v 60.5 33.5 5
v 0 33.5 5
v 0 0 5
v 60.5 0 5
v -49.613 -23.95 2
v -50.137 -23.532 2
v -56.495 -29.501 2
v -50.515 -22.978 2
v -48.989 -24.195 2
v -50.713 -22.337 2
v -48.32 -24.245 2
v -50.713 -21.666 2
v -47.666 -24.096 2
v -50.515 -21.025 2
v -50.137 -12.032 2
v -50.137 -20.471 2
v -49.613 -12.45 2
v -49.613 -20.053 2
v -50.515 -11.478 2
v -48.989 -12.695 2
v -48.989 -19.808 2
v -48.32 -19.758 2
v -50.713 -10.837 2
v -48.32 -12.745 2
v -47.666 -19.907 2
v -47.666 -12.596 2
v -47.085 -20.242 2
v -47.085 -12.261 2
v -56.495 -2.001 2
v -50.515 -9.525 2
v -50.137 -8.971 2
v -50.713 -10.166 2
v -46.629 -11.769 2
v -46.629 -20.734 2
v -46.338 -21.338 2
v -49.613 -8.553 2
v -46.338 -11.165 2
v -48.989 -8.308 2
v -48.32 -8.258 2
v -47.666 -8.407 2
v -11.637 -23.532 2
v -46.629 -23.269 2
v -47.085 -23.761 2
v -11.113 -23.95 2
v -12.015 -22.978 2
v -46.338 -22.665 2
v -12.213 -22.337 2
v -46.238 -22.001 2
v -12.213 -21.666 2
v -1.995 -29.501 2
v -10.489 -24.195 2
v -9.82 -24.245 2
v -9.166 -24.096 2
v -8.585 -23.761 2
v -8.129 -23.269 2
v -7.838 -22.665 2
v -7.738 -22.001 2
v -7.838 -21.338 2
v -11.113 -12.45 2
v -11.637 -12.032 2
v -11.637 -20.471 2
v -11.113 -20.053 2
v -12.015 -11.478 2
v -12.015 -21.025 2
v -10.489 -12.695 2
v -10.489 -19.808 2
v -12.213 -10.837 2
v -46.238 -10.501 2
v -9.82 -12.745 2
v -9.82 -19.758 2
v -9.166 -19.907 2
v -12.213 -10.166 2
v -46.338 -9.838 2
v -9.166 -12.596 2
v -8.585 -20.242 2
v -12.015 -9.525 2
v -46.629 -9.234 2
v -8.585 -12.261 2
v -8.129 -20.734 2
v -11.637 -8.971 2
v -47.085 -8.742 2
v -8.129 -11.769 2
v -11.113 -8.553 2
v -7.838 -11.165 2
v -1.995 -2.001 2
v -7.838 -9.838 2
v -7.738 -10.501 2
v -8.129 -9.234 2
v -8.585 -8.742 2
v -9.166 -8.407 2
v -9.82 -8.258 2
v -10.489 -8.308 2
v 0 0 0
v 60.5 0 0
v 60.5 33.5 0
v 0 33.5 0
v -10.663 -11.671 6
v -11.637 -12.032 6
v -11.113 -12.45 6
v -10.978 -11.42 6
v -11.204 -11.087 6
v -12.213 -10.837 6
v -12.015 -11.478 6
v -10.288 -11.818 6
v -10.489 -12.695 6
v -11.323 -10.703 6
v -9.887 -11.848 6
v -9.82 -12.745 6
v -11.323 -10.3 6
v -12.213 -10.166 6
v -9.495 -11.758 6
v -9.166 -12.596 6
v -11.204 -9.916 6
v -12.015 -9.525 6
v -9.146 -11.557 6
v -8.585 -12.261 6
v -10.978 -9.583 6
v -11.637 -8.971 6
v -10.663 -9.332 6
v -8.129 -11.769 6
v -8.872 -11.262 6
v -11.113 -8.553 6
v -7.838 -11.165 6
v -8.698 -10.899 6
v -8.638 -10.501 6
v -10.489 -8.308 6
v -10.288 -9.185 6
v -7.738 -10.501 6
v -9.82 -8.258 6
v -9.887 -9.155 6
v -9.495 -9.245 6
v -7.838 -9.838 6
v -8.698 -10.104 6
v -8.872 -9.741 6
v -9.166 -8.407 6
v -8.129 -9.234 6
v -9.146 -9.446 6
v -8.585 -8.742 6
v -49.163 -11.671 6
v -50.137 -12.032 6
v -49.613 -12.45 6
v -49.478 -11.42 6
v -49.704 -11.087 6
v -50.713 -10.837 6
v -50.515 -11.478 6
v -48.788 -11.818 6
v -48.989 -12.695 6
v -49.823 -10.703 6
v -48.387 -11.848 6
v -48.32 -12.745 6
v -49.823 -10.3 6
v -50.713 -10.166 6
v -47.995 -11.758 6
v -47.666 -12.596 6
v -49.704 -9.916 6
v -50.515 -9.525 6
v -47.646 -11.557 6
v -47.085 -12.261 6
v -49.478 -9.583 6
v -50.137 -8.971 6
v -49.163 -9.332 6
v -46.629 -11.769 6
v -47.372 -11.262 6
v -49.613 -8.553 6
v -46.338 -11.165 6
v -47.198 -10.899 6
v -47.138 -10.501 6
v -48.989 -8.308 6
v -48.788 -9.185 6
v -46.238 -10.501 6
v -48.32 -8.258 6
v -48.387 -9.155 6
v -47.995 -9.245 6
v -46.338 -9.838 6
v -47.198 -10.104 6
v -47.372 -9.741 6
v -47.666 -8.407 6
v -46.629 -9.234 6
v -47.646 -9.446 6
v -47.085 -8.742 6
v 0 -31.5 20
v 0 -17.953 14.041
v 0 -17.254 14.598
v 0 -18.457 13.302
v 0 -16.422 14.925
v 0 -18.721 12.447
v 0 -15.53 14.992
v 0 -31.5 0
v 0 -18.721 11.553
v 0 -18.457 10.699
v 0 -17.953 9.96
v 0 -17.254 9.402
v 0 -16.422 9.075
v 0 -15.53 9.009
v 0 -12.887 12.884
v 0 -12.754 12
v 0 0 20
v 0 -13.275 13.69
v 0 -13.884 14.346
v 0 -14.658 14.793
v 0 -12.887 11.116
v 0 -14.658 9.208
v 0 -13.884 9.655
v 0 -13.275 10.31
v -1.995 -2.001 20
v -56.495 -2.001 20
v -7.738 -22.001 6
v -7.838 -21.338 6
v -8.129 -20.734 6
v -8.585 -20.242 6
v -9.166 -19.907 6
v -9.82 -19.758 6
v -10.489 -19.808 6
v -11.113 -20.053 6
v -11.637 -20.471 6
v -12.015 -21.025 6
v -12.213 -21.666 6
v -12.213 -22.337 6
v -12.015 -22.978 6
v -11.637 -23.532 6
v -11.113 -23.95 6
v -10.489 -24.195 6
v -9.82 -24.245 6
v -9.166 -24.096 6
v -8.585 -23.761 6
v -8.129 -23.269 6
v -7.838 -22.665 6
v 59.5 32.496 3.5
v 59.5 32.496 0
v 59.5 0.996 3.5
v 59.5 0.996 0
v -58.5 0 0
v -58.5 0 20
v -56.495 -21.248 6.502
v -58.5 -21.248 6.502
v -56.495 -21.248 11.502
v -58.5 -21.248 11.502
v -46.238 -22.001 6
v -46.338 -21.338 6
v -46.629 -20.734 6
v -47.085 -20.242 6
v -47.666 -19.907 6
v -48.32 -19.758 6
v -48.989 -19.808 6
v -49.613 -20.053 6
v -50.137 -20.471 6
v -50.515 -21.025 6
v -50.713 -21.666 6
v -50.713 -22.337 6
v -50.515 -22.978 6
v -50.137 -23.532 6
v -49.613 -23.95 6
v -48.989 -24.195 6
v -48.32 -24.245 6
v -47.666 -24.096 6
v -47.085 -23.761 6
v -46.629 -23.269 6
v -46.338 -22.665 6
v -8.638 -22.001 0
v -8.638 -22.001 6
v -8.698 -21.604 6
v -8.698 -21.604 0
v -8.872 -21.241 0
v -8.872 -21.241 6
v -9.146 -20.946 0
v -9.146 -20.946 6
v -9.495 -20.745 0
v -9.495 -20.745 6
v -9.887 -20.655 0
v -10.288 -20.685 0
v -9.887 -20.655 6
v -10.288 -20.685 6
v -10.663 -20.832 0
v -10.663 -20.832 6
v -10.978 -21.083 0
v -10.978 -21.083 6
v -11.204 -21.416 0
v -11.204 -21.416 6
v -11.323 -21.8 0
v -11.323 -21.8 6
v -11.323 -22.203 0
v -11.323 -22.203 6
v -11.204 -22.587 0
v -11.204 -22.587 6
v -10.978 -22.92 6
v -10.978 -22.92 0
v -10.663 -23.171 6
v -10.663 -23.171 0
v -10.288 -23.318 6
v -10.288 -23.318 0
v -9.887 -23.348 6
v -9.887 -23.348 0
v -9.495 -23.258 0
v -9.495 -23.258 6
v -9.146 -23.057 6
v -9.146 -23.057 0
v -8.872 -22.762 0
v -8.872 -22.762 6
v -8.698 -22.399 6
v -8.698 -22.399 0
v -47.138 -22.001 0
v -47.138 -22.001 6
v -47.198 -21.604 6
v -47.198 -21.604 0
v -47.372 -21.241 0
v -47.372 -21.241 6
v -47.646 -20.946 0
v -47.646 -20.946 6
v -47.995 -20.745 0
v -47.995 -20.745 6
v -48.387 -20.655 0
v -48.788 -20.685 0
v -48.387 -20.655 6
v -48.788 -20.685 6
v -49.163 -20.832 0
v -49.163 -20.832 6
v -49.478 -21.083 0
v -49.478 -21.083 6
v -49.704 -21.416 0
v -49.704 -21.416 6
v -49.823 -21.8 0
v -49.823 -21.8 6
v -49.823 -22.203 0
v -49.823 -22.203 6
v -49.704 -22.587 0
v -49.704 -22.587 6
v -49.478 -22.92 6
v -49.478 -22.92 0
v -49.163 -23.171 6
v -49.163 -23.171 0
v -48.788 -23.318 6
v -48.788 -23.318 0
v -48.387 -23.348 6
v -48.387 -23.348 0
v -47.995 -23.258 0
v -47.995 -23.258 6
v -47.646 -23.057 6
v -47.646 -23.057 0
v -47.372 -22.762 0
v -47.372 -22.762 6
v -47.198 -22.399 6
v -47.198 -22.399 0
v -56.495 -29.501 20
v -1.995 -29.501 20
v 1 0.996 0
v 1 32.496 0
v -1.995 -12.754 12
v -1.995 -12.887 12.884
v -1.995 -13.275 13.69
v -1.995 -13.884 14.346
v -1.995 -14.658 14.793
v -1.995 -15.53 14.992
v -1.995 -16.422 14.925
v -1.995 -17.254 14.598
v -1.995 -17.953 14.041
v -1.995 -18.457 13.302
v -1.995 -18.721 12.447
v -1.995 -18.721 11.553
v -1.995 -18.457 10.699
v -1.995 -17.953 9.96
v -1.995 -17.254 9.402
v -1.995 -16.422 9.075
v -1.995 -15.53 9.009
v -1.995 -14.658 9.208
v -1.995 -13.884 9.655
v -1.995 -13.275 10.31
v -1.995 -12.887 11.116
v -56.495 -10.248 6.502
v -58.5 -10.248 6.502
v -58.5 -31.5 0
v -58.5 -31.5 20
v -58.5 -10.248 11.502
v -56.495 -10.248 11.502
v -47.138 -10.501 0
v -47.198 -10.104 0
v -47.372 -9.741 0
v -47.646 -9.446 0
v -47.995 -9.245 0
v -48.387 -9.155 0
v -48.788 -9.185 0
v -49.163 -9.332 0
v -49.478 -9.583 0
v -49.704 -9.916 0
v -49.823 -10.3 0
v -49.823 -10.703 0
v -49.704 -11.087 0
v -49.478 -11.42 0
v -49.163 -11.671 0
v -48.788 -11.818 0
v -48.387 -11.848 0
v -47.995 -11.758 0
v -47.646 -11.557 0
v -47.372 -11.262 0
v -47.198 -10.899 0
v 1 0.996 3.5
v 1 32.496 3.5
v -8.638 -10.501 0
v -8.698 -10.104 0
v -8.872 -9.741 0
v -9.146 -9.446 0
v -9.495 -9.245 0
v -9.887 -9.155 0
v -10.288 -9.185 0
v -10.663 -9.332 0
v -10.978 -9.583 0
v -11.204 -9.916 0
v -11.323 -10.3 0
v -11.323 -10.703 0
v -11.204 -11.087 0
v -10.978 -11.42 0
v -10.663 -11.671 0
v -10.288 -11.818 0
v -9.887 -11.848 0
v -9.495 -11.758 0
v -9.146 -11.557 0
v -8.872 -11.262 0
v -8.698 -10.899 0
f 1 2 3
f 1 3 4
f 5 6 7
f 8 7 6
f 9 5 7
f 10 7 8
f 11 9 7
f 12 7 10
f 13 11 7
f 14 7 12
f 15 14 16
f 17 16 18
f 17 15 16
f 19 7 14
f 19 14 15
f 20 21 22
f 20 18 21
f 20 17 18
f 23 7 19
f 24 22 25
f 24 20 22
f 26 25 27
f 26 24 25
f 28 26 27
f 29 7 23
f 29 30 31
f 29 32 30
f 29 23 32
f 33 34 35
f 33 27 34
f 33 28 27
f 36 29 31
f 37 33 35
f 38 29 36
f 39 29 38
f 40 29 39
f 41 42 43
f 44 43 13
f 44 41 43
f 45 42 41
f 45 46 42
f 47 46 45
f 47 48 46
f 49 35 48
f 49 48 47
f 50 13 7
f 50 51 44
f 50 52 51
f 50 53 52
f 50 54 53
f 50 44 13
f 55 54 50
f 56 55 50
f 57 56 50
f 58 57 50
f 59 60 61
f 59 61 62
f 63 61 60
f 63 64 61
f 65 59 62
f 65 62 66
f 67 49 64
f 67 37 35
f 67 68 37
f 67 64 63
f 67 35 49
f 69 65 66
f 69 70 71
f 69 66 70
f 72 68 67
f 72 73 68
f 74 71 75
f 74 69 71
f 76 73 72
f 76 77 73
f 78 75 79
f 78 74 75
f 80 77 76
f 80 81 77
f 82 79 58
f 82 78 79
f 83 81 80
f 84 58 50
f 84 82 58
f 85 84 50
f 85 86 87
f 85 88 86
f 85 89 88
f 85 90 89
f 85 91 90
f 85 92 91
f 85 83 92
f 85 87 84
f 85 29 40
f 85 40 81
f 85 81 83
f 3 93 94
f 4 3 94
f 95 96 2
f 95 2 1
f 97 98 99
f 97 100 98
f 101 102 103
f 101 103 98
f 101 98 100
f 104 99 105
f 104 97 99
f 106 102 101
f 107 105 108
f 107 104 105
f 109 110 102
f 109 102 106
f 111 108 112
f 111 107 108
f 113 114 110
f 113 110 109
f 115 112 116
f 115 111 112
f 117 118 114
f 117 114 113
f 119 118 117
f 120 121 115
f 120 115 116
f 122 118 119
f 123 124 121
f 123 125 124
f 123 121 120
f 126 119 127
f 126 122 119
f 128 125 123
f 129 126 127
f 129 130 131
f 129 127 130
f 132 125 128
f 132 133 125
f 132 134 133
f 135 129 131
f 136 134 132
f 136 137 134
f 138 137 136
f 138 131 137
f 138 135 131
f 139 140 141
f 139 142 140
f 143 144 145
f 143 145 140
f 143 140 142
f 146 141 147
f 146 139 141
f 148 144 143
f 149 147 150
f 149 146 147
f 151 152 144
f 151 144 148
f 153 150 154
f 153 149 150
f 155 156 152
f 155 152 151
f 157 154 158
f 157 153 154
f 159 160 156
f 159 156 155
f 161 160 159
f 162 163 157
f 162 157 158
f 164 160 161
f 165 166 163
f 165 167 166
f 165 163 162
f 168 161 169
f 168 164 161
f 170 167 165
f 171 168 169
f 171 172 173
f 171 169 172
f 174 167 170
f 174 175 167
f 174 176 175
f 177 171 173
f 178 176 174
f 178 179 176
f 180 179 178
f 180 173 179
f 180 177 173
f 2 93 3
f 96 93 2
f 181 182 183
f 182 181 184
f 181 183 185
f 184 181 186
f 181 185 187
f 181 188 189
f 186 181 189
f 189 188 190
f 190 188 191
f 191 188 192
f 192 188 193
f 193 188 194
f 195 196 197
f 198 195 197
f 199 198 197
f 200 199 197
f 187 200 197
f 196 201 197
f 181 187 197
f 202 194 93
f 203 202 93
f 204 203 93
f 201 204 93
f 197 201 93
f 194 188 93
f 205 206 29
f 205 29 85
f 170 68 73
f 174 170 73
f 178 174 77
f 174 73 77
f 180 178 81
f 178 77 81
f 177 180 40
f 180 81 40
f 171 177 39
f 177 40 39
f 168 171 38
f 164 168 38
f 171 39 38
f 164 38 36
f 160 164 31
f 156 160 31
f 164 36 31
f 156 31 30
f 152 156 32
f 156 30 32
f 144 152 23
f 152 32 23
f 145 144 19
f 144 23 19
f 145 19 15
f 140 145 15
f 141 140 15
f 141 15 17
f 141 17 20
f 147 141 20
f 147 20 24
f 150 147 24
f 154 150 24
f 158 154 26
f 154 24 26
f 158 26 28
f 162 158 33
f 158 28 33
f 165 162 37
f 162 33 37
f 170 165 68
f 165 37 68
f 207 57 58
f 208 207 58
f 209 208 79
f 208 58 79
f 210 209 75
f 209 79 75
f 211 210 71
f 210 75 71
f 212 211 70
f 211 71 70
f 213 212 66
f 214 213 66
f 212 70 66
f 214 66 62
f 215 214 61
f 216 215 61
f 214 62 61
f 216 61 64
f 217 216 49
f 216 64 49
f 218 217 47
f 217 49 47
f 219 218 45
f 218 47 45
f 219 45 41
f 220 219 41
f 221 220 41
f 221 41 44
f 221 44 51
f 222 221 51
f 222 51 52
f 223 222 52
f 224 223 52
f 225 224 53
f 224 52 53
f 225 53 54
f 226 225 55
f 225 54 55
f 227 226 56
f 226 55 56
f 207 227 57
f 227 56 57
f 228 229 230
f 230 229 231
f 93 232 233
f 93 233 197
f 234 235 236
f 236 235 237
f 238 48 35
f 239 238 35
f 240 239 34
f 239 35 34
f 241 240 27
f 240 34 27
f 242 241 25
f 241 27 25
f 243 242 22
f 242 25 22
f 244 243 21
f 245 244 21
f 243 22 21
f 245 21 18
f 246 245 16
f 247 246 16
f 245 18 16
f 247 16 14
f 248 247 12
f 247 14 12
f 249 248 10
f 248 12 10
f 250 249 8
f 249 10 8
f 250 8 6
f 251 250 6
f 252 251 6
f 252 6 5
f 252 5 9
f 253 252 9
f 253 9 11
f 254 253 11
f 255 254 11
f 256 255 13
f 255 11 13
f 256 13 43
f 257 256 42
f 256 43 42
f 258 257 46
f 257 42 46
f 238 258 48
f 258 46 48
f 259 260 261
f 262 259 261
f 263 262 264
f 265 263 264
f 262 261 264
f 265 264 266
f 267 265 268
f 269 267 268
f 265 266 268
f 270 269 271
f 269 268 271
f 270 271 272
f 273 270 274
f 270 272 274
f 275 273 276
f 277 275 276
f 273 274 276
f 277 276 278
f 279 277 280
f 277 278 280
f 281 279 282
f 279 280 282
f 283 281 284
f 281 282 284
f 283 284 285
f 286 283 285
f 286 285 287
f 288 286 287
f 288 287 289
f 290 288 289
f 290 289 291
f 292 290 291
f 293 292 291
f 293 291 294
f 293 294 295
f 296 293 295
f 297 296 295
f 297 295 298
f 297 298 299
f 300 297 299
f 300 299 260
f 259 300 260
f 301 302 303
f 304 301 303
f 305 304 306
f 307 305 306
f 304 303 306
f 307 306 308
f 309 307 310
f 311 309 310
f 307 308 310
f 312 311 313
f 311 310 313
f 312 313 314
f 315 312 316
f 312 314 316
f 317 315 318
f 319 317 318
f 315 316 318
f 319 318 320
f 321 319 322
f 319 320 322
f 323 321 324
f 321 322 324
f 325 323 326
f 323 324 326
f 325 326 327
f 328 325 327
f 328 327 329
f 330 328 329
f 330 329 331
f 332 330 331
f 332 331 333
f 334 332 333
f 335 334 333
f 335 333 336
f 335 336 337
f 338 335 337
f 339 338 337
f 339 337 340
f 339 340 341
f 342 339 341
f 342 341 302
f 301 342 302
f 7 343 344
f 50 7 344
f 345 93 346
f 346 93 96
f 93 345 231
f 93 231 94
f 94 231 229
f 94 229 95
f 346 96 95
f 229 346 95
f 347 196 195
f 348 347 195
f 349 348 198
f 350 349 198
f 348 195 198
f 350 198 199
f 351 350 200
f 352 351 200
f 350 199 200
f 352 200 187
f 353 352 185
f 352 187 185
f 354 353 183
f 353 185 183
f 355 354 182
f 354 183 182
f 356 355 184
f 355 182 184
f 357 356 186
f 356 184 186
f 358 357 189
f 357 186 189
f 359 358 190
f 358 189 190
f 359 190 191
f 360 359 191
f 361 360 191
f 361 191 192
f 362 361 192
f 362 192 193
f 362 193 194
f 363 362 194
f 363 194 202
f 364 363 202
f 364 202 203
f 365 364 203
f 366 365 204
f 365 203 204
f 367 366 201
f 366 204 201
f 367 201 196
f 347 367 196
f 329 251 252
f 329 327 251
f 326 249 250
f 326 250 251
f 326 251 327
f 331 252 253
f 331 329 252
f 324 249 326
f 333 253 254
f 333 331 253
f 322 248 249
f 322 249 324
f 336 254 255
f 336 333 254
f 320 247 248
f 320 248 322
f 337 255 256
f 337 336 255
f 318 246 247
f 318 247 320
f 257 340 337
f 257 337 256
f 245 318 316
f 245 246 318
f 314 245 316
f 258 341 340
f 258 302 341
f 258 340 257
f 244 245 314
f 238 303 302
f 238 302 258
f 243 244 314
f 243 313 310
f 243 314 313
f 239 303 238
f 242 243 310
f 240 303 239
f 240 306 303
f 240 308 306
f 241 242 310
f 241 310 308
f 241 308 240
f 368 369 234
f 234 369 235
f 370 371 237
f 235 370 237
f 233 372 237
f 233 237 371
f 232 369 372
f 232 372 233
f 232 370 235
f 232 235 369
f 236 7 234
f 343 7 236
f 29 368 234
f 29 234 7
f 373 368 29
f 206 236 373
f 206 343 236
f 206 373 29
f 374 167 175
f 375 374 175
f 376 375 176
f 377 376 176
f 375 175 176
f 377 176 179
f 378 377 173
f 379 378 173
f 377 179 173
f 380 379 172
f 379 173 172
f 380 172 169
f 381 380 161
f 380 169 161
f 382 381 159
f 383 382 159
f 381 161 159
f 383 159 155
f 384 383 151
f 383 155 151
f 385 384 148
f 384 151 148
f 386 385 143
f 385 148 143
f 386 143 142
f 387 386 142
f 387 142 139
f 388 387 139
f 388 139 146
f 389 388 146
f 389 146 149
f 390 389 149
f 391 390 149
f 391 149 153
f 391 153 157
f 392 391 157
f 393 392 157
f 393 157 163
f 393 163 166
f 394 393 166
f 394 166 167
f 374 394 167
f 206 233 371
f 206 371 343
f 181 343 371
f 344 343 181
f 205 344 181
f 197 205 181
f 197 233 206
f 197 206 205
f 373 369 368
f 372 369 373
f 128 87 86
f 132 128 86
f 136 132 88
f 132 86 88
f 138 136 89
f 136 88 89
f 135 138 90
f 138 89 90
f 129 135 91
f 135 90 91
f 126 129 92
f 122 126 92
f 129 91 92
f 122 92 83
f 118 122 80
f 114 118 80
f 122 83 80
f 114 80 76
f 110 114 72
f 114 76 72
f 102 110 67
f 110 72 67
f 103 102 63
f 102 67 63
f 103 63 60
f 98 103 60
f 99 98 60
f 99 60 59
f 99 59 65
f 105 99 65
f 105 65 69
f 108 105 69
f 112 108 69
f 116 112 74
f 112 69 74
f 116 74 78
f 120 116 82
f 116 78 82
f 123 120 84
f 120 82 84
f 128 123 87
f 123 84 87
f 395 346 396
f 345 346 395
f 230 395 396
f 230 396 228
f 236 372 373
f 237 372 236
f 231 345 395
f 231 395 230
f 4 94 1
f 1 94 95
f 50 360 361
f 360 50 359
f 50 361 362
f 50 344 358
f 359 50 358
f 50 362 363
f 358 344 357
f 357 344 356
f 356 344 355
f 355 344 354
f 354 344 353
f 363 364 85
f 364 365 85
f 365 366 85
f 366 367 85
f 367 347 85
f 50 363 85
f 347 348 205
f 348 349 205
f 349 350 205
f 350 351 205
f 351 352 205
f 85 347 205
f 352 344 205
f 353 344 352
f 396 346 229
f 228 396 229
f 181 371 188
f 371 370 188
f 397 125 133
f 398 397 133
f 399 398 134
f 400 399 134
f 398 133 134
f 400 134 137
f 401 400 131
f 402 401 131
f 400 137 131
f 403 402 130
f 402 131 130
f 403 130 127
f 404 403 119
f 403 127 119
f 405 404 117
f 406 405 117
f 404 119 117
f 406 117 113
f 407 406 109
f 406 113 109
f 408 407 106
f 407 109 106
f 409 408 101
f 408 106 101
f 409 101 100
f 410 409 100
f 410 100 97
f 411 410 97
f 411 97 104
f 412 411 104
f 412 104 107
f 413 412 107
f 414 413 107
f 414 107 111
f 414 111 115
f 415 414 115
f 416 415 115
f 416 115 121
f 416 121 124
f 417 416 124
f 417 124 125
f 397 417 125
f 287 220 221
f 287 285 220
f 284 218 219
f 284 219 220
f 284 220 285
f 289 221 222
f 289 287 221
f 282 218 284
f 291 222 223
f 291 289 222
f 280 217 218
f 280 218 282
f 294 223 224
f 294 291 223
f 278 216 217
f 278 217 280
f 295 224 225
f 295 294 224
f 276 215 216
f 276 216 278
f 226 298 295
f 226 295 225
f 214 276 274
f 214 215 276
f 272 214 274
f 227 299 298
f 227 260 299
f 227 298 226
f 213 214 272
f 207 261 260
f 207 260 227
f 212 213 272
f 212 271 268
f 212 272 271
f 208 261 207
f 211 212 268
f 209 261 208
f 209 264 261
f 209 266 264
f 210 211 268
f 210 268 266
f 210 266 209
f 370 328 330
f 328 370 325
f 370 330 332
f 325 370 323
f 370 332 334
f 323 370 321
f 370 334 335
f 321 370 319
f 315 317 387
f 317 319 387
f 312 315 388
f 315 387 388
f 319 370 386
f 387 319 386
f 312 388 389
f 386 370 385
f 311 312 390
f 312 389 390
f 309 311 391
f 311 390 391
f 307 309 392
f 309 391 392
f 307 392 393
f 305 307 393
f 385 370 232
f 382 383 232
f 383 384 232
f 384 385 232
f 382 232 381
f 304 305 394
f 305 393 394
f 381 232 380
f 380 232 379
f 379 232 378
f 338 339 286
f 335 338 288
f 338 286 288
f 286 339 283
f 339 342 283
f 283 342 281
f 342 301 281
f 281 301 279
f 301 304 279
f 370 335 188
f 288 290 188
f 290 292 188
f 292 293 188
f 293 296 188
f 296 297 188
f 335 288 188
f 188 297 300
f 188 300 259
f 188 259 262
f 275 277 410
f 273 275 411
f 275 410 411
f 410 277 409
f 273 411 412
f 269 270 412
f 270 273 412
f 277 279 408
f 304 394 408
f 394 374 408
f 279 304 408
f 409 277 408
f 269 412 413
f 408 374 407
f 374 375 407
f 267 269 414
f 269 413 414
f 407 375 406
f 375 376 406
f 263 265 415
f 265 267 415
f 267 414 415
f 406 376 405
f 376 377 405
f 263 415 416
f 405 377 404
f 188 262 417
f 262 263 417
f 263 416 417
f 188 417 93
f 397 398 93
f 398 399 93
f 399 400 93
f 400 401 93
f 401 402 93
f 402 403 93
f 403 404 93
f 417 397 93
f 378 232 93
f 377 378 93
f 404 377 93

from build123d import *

# Parameters (mm, degrees)
SKETCH_W        = 58.5
SKETCH_H        = 31.5
PAD_DEPTH       = 2
SKETCH001_W     = 58.5
SKETCH001_H     = 31.5
PAD001_DEPTH    = 18
SKETCH002_W     = 54.5
SKETCH002_H     = 27.5
POCKET_DEPTH    = 18
SKETCH003_R     = 2.25
PAD002_DEPTH    = 4
SKETCH004_R     = 1.35
POCKET001_DEPTH = 6.501
SKETCH006_W     = 11
SKETCH006_H     = 5
POCKET002_DEPTH = 2.004769
SKETCH007_R     = 3
POCKET003_DEPTH = 1.995231
SKETCH008_W     = 60.5
SKETCH008_H     = 33.5
PAD003_DEPTH    = 5
SKETCH009_W     = 58.5
SKETCH009_H     = 31.5
POCKET004_DEPTH = 3.5


with BuildPart() as body001:
    # Sketch → Pad (new body)
    with BuildSketch(Plane.XY):
        with Locations((-29.25, -15.75)):
            Rectangle(SKETCH_W, SKETCH_H)
    extrude(amount=PAD_DEPTH)

    # Sketch001 (on Face6 of Pad) → Pad001 (join)
    with BuildSketch(Plane.XY.offset(2)):
        with Locations((-29.25, -15.75)):
            Rectangle(SKETCH001_W, SKETCH001_H)
    extrude(amount=PAD001_DEPTH)

    # Sketch002 (on Face3 of Pad001) → Pocket (cut)
    with BuildSketch(Plane.XY.offset(20)):
        with Locations((-29.245231, -15.750885)):
            Rectangle(SKETCH002_W, SKETCH002_H)
    extrude(amount=-POCKET_DEPTH, mode=Mode.SUBTRACT)

    # Sketch003 (on Face11 of Pocket) → Pad002 (join)
    with BuildSketch(Plane.XY.offset(2)):
        with Locations((-48.487888, -10.501435)):
            Circle(SKETCH003_R)
        with Locations((-48.487888, -22.001435)):
            Circle(SKETCH003_R)
        with Locations((-9.987888, -22.001435)):
            Circle(SKETCH003_R)
        with Locations((-9.987888, -10.501435)):
            Circle(SKETCH003_R)
    extrude(amount=PAD002_DEPTH)

    # Sketch004 → Pocket001 (cut, through all)
    with BuildSketch(Plane.XY.offset(6.5)):
        with Locations((-48.487888, -10.501435)):
            Circle(SKETCH004_R)
        with Locations((-48.487888, -22.001435)):
            Circle(SKETCH004_R)
        with Locations((-9.987888, -22.001435)):
            Circle(SKETCH004_R)
        with Locations((-9.987888, -10.501435)):
            Circle(SKETCH004_R)
    extrude(amount=-POCKET001_DEPTH, mode=Mode.SUBTRACT)

    # Sketch006 (on Face4 of Pocket001) → Pocket002 (cut)
    with BuildSketch(Plane(origin=(-58.5, 0, 0), x_dir=(0, -1, 0), z_dir=(-1, 0, 0))):
        with Locations((15.747794, 9.001689)):
            Rectangle(SKETCH006_W, SKETCH006_H)
    extrude(amount=-POCKET002_DEPTH, mode=Mode.SUBTRACT)

    # Sketch007 (on Face3 of Pocket002) → Pocket003 (cut)
    with BuildSketch(Plane.YZ):
        with Locations((-15.754011, 12.000229)):
            Circle(SKETCH007_R)
    extrude(amount=-POCKET003_DEPTH, mode=Mode.SUBTRACT)


with BuildPart() as body:
    # Sketch008 → Pad003 (new body)
    with BuildSketch(Plane.XY):
        with Locations((30.25, 16.75)):
            Rectangle(SKETCH008_W, SKETCH008_H)
    extrude(amount=PAD003_DEPTH)

    # Sketch009 (on Face5 of Pad003) → Pocket004 (cut)
    with BuildSketch(Plane(origin=(0, 0, 0), x_dir=(1, 0, 0), z_dir=(0, 0, -1))):
        with Locations((30.249979, -16.746071)):
            Rectangle(SKETCH009_W, SKETCH009_H)
    extrude(amount=-POCKET004_DEPTH, mode=Mode.SUBTRACT)


solid = Compound([body001.part, body.part])
